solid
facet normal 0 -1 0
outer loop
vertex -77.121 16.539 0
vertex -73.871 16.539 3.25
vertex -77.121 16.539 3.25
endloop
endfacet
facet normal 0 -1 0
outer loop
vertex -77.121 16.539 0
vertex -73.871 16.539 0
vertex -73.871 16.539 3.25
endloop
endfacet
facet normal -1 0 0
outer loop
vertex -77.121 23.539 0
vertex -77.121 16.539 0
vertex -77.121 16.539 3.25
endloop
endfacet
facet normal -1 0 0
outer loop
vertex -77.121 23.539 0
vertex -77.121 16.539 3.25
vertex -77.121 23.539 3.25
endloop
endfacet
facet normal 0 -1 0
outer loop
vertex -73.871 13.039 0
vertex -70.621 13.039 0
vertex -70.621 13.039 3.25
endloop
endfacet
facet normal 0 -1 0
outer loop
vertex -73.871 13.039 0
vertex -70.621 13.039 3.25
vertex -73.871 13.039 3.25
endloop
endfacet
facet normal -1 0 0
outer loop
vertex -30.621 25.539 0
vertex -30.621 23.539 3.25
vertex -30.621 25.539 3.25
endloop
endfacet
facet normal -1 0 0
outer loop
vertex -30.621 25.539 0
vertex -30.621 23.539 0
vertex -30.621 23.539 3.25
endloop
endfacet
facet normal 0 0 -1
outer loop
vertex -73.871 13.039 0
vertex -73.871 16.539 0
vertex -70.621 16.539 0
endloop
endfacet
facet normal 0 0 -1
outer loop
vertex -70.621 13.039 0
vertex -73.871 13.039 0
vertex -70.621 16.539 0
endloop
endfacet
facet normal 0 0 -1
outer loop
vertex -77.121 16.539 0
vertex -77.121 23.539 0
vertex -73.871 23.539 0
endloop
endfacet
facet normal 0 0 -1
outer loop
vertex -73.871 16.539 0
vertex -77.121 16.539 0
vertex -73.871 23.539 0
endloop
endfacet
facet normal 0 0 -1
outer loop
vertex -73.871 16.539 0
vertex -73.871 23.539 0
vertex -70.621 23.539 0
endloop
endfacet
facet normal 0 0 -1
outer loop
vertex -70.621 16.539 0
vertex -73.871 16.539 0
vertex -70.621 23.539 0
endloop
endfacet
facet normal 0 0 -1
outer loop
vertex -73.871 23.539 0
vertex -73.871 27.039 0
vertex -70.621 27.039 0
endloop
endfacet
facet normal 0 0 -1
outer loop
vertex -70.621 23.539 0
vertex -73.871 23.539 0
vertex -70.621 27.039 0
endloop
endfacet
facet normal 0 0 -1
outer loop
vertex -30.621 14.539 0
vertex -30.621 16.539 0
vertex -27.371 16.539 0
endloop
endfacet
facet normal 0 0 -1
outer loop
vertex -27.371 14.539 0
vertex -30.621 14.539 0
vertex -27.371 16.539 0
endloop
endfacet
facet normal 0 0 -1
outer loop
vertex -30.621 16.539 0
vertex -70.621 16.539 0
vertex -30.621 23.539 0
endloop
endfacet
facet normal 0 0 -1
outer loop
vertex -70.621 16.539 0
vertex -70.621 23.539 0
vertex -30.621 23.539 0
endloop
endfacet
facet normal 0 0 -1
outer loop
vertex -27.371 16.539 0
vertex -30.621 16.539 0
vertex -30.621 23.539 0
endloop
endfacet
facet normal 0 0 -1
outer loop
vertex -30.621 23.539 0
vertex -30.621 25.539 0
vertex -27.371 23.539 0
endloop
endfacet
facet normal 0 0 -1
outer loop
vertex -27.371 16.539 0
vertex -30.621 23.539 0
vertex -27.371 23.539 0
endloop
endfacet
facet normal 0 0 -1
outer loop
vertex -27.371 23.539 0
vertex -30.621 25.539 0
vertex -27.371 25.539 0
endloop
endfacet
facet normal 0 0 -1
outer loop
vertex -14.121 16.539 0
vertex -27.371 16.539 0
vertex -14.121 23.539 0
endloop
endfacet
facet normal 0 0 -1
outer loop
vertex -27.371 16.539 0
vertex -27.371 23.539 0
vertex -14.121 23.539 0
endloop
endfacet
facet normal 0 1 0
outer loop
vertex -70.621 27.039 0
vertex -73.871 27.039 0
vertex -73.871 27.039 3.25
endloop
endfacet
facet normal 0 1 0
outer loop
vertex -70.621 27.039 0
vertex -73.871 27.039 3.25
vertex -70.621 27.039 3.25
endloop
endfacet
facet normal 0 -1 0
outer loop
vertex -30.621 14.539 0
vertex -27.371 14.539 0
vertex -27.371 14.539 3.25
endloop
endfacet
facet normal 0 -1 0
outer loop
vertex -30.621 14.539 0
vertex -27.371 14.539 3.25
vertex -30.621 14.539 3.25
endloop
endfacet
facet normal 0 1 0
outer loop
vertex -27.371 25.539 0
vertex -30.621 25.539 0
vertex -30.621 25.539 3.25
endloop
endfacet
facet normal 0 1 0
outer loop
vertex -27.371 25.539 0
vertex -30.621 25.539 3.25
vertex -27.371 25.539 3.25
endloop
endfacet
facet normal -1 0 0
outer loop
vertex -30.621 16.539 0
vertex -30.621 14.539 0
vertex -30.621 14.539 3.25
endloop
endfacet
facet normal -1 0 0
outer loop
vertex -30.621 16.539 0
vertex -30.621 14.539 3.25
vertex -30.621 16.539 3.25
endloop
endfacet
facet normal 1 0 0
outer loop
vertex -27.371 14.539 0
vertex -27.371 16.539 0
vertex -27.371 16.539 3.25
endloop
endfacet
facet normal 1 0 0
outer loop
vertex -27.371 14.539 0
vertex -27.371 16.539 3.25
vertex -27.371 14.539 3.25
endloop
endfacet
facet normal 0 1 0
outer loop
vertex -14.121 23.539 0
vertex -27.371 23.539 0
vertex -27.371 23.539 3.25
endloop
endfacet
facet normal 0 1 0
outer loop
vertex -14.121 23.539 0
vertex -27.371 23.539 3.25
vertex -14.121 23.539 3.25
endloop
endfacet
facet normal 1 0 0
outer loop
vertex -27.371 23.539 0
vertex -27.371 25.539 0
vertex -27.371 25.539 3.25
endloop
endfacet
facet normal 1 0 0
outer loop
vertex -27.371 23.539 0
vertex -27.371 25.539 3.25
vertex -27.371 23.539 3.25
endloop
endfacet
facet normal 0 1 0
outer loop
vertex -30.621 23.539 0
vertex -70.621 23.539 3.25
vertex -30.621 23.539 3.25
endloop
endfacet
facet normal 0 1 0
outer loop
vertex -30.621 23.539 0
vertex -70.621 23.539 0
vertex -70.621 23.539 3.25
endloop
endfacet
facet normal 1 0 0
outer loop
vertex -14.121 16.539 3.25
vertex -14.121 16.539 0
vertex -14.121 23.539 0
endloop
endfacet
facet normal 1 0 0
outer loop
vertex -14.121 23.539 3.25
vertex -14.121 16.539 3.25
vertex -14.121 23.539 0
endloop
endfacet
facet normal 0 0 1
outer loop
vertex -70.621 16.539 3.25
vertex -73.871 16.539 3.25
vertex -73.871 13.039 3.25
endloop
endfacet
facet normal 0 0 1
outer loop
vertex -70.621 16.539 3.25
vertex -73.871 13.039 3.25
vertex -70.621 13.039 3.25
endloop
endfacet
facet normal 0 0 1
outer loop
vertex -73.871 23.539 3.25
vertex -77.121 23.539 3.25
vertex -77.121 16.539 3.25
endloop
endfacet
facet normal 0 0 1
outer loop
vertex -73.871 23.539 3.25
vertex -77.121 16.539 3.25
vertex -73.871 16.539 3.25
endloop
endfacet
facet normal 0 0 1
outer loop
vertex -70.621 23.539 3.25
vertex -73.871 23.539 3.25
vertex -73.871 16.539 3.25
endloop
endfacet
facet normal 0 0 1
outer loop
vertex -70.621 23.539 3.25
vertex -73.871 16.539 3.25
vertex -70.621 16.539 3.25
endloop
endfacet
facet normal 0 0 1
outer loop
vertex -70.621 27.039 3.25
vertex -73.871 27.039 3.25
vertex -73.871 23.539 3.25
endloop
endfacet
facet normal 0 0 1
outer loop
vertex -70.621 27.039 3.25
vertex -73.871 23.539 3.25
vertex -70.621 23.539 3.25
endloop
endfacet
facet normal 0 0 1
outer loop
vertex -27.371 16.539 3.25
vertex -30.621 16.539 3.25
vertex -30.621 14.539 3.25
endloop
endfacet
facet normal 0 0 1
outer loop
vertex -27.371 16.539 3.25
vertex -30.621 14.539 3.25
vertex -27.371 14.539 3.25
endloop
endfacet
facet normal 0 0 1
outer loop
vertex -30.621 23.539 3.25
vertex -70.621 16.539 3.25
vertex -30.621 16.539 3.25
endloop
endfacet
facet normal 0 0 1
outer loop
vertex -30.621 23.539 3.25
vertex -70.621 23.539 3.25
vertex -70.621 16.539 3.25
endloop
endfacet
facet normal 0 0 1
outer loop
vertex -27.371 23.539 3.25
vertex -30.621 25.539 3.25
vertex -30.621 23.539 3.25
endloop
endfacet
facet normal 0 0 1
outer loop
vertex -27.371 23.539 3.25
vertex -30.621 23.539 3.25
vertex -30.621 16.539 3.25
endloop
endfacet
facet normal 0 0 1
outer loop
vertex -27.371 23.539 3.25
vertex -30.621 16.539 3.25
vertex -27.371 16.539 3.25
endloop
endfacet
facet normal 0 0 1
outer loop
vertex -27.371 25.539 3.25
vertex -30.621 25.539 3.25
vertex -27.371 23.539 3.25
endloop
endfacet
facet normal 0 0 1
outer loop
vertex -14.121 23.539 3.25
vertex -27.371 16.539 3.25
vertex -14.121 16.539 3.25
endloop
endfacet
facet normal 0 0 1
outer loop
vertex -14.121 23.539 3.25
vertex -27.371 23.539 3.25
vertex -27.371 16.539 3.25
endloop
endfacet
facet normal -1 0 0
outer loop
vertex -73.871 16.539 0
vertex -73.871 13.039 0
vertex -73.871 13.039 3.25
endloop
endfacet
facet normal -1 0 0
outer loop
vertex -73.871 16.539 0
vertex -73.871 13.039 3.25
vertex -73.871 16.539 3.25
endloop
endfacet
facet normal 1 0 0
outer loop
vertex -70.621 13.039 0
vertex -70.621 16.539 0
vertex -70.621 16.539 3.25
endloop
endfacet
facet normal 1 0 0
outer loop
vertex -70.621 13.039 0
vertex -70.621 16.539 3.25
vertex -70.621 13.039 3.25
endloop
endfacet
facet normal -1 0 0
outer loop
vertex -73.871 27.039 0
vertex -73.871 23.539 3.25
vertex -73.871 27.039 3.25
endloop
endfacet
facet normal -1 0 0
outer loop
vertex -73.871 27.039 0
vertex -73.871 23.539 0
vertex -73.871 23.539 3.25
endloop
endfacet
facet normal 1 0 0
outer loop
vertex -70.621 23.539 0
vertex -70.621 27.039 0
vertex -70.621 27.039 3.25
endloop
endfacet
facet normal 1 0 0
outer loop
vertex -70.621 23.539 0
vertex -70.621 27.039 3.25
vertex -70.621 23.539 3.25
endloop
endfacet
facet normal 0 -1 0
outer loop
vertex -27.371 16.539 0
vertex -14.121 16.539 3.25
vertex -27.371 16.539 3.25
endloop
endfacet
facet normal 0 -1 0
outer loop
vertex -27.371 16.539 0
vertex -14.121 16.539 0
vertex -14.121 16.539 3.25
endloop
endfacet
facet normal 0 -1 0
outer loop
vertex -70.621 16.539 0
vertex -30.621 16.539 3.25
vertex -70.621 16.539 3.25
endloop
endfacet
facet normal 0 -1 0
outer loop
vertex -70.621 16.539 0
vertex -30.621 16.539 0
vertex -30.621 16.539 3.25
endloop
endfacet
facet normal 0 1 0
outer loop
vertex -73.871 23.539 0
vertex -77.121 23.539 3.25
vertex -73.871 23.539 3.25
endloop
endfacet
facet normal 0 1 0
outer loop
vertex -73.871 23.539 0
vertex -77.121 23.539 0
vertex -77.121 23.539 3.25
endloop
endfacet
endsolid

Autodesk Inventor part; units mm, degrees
ref_plane "YZ Plane" through (0, 0, 0) normal (1, 0, 0) x (0, 1, 0)
ref_plane "XZ Plane" through (0, 0, 0) normal (0, 1, 0) x (-1, 0, 0)
ref_plane "XY Plane" through (0, 0, 0) normal (0, 0, 1) x (1, 0, 0)
sketch "Sketch1" plane through (0, 0, 0) normal (0, 0, 1) x (1, 0, 0)
  line L0 (-92.7646, -8.503) -> (-89.7646, -8.503)
  line L1 (-89.7646, -8.503) -> (-89.7646, -11.753)
  line L2 (-89.7646, -11.753) -> (-92.7646, -11.753)
  line L3 (-92.7646, -11.753) -> (-92.7646, -8.503)
  line L4 (-92.7646, -21.6527) -> (-89.7646, -21.6527)
  line L5 (-89.7646, -21.6527) -> (-89.7646, -21.7527)
  line L6 (-89.7646, -21.7527) -> (-92.7646, -21.7527)
  line L7 (-92.7646, -21.7527) -> (-92.7646, -21.6527)
  line L8 (-70.621, 23.5389) -> (-20.621, 23.5389)
  line L9 (-20.621, 23.5389) -> (-20.621, 16.5389)
  line L10 (-20.621, 16.5389) -> (-70.621, 16.5389)
  line L11 (-70.621, 16.5389) -> (-70.621, 23.5389)
  line L12 (-73.871, 27.0389) -> (-70.621, 27.0389)
  line L13 (-70.621, 27.0389) -> (-70.621, 13.0389)
  line L14 (-70.621, 13.0389) -> (-73.871, 13.0389)
  line L15 (-73.871, 13.0389) -> (-73.871, 27.0389)
  line L16 (-73.871, 20.0389) -> (-70.621, 20.0389) construction
  line L17 (-20.621, 20.0389) -> (-70.621, 20.0389) construction
  line L18 (-45.621, 23.5389) -> (-45.621, 16.5389) construction
  line L19 (-77.121, 23.5389) -> (-73.871, 23.5389)
  line L20 (-73.871, 23.5389) -> (-73.871, 16.5389)
  line L21 (-73.871, 16.5389) -> (-77.121, 16.5389)
  line L22 (-77.121, 16.5389) -> (-77.121, 23.5389)
  line L23 (-77.121, 20.0389) -> (-73.871, 20.0389) construction
  line L24 (-20.621, 23.5389) -> (-17.371, 23.5389)
  line L25 (-17.371, 23.5389) -> (-17.371, 16.5389)
  line L26 (-17.371, 16.5389) -> (-20.621, 16.5389)
  line L27 (-20.621, 16.5389) -> (-20.621, 23.5389)
  line L28 (-14.121, 23.5389) -> (-17.371, 23.5389)
  line L29 (-17.371, 23.5389) -> (-17.371, 16.5389)
  line L30 (-17.371, 16.5389) -> (-14.121, 16.5389)
  line L31 (-14.121, 16.5389) -> (-14.121, 23.5389)
  line L32 (-14.121, 20.0389) -> (-17.371, 20.0389) construction
  line L33 (-30.621, 25.5389) -> (-27.371, 25.5389)
  line L34 (-27.371, 25.5389) -> (-27.371, 14.5389)
  line L35 (-27.371, 14.5389) -> (-30.621, 14.5389)
  line L36 (-30.621, 14.5389) -> (-30.621, 25.5389)
  line L37 (-30.621, 20.0389) -> (-27.371, 20.0389) construction
  point P0 (0, 0)
  point P1 (-17.371, 20.0389)
  dimension "d3" = 3
  dimension "mat" = 3.25
  dimension "d5" = 3
  dimension "kerf" = 0.1
  dimension "d44" = 3.25
  dimension "d45" = 14
  dimension "d46" = 3.25
  dimension "d47" = 7
  dimension "d48" = 50
  dimension "d49" = 3.25
  dimension "d50" = 7
  dimension "d53" = 3.25
  dimension "d54" = 11
  dimension "d55" = 40
extrude "Extrusion6" add sketch "Sketch1" along normal blind 3.25 contours L8 L36 L10 L11 | L11 L13 L14 L15 L12 | L8 L34 L10 L36 | L8 L9 L10 L34 | L24 L25 L26 L9 | L15 L21 L22 L19 | L28 L31 L30 L25
extrude "Extrusion7" add sketch "Sketch1" along normal blind 3.25 contours L36 L33 L34 L8 | L8 L34 L10 L36 | L10 L34 L35 L36
equation "\"d44\" = mat"
equation "\"d46\" = mat"
equation "\"d49\" = mat"
equation "\"d53\" = mat"
equation "\"d51\" = mat"
equation "\"d56\" = mat"
properties part number "body-back"
